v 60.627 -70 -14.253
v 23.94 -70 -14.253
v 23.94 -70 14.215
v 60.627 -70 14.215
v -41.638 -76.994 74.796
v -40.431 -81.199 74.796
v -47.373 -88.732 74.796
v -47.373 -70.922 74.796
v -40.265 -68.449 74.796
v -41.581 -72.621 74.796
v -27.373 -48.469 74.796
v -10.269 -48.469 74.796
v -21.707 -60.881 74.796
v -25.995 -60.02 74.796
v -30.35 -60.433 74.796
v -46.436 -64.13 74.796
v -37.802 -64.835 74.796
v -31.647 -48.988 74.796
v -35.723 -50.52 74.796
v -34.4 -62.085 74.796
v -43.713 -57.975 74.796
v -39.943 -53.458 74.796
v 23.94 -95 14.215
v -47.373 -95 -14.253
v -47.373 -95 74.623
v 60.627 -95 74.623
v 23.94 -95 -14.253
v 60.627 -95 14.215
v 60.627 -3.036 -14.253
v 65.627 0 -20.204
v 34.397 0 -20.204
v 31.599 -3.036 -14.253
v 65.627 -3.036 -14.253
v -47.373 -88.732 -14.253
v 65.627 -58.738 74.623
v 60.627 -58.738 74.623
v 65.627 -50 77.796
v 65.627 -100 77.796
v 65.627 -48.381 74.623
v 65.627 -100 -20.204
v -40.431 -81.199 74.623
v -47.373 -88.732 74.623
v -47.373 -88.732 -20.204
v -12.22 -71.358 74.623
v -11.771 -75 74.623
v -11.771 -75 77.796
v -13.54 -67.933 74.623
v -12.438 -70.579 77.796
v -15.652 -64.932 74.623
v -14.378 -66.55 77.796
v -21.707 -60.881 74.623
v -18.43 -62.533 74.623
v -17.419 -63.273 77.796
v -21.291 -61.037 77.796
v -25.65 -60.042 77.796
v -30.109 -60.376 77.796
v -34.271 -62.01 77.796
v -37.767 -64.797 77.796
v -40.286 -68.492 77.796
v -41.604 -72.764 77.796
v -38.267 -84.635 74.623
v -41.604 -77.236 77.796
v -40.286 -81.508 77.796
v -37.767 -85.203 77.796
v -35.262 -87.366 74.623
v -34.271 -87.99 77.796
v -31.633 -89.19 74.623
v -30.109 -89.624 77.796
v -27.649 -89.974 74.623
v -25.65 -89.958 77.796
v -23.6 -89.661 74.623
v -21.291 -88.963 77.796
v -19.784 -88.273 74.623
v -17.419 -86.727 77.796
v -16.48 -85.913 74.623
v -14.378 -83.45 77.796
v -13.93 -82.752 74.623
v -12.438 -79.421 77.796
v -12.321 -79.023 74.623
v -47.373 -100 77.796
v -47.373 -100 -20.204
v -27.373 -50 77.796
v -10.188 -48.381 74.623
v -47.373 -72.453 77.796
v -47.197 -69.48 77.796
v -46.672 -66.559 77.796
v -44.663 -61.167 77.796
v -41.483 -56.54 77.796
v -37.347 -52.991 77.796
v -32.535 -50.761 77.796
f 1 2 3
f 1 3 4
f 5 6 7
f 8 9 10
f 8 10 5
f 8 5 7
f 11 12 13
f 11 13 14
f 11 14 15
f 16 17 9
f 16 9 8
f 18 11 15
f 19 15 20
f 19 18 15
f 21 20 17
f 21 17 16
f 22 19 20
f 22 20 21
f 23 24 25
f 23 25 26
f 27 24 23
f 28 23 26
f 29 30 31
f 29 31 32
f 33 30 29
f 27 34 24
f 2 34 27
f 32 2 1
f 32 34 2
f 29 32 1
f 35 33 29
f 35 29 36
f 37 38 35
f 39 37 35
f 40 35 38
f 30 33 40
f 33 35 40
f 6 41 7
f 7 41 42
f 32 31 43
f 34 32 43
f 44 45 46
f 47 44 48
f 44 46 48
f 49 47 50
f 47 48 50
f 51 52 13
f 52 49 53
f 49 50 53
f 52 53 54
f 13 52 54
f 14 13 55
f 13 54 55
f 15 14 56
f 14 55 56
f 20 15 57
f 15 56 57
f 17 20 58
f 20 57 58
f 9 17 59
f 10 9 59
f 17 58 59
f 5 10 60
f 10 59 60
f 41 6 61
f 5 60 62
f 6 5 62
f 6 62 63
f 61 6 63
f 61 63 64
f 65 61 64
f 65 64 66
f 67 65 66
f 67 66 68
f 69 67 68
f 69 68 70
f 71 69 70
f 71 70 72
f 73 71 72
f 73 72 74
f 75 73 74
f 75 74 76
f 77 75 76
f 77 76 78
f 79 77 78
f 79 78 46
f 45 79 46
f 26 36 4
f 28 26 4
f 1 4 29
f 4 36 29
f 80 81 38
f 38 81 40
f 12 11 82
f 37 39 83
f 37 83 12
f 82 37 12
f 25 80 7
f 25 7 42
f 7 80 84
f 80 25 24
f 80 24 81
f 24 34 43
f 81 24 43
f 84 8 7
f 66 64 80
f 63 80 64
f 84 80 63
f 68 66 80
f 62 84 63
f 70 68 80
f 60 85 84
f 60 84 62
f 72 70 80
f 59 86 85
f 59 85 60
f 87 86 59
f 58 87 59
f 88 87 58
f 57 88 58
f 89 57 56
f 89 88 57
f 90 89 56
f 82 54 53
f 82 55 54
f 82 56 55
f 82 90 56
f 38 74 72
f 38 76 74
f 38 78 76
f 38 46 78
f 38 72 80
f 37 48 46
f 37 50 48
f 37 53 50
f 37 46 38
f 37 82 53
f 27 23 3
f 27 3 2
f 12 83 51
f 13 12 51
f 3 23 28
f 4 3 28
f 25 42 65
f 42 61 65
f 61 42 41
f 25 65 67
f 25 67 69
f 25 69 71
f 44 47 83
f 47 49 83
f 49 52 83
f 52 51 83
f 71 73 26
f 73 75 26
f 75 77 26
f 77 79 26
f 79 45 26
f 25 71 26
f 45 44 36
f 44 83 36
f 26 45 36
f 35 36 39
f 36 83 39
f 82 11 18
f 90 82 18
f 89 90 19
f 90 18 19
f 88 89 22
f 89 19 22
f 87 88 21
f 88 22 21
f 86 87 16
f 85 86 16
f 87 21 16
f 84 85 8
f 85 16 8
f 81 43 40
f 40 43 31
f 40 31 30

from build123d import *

# Parameters (mm, degrees)
SKETCH1_W           = 113
SKETCH1_H           = 98
BOSS_EXTRUDE1_DEPTH = 100
CUT_EXTRUDE1_DEPTH  = 130
CUT_EXTRUDE3_DEPTH  = 95
SKETCH4_W           = 113
SKETCH4_H           = 88.876192891
CUT_EXTRUDE4_DEPTH  = 95
BOSS_EXTRUDE4_DEPTH = 5
SKETCH7_W           = 36.687301185
SKETCH7_H           = 28.468155535
BOSS_EXTRUDE6_DEPTH = 25
SKETCH8_R           = 15
CUT_EXTRUDE5_DEPTH  = 25
FILLET1_R           = 20


with BuildPart() as part:
    # Sketch1 → Boss-Extrude1 (new body)
    with BuildSketch(Plane(origin=(0, 0, 0), x_dir=(1, 0, 0), z_dir=(0, 1, 0))):
        with Locations((9.126923077, -28.796153846)):
            Rectangle(SKETCH1_W, SKETCH1_H)
    extrude(amount=-BOSS_EXTRUDE1_DEPTH)

    # Sketch2 → Cut-Extrude1 (cut)
    with BuildSketch(Plane(origin=(65.626923077, 0, 0), x_dir=(0, 0, -1), z_dir=(1, 0, 0))):
        Polygon((20.203846154, 0), (-77.796153846, -50), (-77.796153846, 0), align=None)
    extrude(amount=-CUT_EXTRUDE1_DEPTH, mode=Mode.SUBTRACT)

    # Sketch3 → Cut-Extrude3 (cut)
    with BuildSketch(Plane(origin=(0, 0, -20.203846154), x_dir=(-1, 0, 0), z_dir=(0, 0, -1))):
        Polygon((-34.397311681, 0), (47.373076923, -88.732184402), (47.373076923, 0), align=None)
    extrude(amount=-CUT_EXTRUDE3_DEPTH, mode=Mode.SUBTRACT)

    # Sketch4 → Cut-Extrude4 (cut)
    with BuildSketch(Plane(origin=(0, 0, 0), x_dir=(1, 0, 0), z_dir=(0, 1, 0))):
        with Locations((9.126923077, -30.184844361)):
            Rectangle(SKETCH4_W, SKETCH4_H)
    extrude(amount=-CUT_EXTRUDE4_DEPTH, mode=Mode.SUBTRACT)

    # Sketch6 → Boss-Extrude4 (add)
    with BuildSketch(Plane(origin=(65.626923077, 0, 0), x_dir=(0, 0, -1), z_dir=(1, 0, 0))):
        Polygon((14.253252085, -95), (14.253252085, -3.036017382), (-74.622940806, -58.738358676), (-74.622940806, -95), align=None)
    extrude(amount=-BOSS_EXTRUDE4_DEPTH)

    # Sketch7 → Boss-Extrude6 (add)
    with BuildSketch(Plane(origin=(0, -95, 0), x_dir=(1, 0, 0), z_dir=(0, 1, 0))):
        with Locations((42.283272485, 0.019174318)):
            Rectangle(SKETCH7_W, SKETCH7_H)
    extrude(amount=BOSS_EXTRUDE6_DEPTH)

    # Sketch8 → Cut-Extrude5 (cut)
    with BuildSketch(Plane.XY.offset(77.796153846)):
        with Locations((-26.771199052, -75)):
            Circle(SKETCH8_R)
    extrude(amount=-CUT_EXTRUDE5_DEPTH, mode=Mode.SUBTRACT)

    # Fillet1
    # the kernel refuses this fillet: 20 mm, written as the material it takes off along each edge
    with BuildSketch(Plane(origin=(-47.373076923, -25.745870671, 30.258060361), x_dir=(0, -0.8907618697082329, -0.454470341687874), z_dir=(0, -0.45447034168787404, 0.890761869708233))) as fillet1_piece_1:
        with BuildLine():
            CenterArc((FILLET1_R, FILLET1_R), FILLET1_R, 180, 90)
            Line((0, FILLET1_R), (0, 0))
            Line((0, 0), (FILLET1_R, 0))
        make_face()
    extrude(amount=103.367903479, mode=Mode.SUBTRACT)


solid = part.part
